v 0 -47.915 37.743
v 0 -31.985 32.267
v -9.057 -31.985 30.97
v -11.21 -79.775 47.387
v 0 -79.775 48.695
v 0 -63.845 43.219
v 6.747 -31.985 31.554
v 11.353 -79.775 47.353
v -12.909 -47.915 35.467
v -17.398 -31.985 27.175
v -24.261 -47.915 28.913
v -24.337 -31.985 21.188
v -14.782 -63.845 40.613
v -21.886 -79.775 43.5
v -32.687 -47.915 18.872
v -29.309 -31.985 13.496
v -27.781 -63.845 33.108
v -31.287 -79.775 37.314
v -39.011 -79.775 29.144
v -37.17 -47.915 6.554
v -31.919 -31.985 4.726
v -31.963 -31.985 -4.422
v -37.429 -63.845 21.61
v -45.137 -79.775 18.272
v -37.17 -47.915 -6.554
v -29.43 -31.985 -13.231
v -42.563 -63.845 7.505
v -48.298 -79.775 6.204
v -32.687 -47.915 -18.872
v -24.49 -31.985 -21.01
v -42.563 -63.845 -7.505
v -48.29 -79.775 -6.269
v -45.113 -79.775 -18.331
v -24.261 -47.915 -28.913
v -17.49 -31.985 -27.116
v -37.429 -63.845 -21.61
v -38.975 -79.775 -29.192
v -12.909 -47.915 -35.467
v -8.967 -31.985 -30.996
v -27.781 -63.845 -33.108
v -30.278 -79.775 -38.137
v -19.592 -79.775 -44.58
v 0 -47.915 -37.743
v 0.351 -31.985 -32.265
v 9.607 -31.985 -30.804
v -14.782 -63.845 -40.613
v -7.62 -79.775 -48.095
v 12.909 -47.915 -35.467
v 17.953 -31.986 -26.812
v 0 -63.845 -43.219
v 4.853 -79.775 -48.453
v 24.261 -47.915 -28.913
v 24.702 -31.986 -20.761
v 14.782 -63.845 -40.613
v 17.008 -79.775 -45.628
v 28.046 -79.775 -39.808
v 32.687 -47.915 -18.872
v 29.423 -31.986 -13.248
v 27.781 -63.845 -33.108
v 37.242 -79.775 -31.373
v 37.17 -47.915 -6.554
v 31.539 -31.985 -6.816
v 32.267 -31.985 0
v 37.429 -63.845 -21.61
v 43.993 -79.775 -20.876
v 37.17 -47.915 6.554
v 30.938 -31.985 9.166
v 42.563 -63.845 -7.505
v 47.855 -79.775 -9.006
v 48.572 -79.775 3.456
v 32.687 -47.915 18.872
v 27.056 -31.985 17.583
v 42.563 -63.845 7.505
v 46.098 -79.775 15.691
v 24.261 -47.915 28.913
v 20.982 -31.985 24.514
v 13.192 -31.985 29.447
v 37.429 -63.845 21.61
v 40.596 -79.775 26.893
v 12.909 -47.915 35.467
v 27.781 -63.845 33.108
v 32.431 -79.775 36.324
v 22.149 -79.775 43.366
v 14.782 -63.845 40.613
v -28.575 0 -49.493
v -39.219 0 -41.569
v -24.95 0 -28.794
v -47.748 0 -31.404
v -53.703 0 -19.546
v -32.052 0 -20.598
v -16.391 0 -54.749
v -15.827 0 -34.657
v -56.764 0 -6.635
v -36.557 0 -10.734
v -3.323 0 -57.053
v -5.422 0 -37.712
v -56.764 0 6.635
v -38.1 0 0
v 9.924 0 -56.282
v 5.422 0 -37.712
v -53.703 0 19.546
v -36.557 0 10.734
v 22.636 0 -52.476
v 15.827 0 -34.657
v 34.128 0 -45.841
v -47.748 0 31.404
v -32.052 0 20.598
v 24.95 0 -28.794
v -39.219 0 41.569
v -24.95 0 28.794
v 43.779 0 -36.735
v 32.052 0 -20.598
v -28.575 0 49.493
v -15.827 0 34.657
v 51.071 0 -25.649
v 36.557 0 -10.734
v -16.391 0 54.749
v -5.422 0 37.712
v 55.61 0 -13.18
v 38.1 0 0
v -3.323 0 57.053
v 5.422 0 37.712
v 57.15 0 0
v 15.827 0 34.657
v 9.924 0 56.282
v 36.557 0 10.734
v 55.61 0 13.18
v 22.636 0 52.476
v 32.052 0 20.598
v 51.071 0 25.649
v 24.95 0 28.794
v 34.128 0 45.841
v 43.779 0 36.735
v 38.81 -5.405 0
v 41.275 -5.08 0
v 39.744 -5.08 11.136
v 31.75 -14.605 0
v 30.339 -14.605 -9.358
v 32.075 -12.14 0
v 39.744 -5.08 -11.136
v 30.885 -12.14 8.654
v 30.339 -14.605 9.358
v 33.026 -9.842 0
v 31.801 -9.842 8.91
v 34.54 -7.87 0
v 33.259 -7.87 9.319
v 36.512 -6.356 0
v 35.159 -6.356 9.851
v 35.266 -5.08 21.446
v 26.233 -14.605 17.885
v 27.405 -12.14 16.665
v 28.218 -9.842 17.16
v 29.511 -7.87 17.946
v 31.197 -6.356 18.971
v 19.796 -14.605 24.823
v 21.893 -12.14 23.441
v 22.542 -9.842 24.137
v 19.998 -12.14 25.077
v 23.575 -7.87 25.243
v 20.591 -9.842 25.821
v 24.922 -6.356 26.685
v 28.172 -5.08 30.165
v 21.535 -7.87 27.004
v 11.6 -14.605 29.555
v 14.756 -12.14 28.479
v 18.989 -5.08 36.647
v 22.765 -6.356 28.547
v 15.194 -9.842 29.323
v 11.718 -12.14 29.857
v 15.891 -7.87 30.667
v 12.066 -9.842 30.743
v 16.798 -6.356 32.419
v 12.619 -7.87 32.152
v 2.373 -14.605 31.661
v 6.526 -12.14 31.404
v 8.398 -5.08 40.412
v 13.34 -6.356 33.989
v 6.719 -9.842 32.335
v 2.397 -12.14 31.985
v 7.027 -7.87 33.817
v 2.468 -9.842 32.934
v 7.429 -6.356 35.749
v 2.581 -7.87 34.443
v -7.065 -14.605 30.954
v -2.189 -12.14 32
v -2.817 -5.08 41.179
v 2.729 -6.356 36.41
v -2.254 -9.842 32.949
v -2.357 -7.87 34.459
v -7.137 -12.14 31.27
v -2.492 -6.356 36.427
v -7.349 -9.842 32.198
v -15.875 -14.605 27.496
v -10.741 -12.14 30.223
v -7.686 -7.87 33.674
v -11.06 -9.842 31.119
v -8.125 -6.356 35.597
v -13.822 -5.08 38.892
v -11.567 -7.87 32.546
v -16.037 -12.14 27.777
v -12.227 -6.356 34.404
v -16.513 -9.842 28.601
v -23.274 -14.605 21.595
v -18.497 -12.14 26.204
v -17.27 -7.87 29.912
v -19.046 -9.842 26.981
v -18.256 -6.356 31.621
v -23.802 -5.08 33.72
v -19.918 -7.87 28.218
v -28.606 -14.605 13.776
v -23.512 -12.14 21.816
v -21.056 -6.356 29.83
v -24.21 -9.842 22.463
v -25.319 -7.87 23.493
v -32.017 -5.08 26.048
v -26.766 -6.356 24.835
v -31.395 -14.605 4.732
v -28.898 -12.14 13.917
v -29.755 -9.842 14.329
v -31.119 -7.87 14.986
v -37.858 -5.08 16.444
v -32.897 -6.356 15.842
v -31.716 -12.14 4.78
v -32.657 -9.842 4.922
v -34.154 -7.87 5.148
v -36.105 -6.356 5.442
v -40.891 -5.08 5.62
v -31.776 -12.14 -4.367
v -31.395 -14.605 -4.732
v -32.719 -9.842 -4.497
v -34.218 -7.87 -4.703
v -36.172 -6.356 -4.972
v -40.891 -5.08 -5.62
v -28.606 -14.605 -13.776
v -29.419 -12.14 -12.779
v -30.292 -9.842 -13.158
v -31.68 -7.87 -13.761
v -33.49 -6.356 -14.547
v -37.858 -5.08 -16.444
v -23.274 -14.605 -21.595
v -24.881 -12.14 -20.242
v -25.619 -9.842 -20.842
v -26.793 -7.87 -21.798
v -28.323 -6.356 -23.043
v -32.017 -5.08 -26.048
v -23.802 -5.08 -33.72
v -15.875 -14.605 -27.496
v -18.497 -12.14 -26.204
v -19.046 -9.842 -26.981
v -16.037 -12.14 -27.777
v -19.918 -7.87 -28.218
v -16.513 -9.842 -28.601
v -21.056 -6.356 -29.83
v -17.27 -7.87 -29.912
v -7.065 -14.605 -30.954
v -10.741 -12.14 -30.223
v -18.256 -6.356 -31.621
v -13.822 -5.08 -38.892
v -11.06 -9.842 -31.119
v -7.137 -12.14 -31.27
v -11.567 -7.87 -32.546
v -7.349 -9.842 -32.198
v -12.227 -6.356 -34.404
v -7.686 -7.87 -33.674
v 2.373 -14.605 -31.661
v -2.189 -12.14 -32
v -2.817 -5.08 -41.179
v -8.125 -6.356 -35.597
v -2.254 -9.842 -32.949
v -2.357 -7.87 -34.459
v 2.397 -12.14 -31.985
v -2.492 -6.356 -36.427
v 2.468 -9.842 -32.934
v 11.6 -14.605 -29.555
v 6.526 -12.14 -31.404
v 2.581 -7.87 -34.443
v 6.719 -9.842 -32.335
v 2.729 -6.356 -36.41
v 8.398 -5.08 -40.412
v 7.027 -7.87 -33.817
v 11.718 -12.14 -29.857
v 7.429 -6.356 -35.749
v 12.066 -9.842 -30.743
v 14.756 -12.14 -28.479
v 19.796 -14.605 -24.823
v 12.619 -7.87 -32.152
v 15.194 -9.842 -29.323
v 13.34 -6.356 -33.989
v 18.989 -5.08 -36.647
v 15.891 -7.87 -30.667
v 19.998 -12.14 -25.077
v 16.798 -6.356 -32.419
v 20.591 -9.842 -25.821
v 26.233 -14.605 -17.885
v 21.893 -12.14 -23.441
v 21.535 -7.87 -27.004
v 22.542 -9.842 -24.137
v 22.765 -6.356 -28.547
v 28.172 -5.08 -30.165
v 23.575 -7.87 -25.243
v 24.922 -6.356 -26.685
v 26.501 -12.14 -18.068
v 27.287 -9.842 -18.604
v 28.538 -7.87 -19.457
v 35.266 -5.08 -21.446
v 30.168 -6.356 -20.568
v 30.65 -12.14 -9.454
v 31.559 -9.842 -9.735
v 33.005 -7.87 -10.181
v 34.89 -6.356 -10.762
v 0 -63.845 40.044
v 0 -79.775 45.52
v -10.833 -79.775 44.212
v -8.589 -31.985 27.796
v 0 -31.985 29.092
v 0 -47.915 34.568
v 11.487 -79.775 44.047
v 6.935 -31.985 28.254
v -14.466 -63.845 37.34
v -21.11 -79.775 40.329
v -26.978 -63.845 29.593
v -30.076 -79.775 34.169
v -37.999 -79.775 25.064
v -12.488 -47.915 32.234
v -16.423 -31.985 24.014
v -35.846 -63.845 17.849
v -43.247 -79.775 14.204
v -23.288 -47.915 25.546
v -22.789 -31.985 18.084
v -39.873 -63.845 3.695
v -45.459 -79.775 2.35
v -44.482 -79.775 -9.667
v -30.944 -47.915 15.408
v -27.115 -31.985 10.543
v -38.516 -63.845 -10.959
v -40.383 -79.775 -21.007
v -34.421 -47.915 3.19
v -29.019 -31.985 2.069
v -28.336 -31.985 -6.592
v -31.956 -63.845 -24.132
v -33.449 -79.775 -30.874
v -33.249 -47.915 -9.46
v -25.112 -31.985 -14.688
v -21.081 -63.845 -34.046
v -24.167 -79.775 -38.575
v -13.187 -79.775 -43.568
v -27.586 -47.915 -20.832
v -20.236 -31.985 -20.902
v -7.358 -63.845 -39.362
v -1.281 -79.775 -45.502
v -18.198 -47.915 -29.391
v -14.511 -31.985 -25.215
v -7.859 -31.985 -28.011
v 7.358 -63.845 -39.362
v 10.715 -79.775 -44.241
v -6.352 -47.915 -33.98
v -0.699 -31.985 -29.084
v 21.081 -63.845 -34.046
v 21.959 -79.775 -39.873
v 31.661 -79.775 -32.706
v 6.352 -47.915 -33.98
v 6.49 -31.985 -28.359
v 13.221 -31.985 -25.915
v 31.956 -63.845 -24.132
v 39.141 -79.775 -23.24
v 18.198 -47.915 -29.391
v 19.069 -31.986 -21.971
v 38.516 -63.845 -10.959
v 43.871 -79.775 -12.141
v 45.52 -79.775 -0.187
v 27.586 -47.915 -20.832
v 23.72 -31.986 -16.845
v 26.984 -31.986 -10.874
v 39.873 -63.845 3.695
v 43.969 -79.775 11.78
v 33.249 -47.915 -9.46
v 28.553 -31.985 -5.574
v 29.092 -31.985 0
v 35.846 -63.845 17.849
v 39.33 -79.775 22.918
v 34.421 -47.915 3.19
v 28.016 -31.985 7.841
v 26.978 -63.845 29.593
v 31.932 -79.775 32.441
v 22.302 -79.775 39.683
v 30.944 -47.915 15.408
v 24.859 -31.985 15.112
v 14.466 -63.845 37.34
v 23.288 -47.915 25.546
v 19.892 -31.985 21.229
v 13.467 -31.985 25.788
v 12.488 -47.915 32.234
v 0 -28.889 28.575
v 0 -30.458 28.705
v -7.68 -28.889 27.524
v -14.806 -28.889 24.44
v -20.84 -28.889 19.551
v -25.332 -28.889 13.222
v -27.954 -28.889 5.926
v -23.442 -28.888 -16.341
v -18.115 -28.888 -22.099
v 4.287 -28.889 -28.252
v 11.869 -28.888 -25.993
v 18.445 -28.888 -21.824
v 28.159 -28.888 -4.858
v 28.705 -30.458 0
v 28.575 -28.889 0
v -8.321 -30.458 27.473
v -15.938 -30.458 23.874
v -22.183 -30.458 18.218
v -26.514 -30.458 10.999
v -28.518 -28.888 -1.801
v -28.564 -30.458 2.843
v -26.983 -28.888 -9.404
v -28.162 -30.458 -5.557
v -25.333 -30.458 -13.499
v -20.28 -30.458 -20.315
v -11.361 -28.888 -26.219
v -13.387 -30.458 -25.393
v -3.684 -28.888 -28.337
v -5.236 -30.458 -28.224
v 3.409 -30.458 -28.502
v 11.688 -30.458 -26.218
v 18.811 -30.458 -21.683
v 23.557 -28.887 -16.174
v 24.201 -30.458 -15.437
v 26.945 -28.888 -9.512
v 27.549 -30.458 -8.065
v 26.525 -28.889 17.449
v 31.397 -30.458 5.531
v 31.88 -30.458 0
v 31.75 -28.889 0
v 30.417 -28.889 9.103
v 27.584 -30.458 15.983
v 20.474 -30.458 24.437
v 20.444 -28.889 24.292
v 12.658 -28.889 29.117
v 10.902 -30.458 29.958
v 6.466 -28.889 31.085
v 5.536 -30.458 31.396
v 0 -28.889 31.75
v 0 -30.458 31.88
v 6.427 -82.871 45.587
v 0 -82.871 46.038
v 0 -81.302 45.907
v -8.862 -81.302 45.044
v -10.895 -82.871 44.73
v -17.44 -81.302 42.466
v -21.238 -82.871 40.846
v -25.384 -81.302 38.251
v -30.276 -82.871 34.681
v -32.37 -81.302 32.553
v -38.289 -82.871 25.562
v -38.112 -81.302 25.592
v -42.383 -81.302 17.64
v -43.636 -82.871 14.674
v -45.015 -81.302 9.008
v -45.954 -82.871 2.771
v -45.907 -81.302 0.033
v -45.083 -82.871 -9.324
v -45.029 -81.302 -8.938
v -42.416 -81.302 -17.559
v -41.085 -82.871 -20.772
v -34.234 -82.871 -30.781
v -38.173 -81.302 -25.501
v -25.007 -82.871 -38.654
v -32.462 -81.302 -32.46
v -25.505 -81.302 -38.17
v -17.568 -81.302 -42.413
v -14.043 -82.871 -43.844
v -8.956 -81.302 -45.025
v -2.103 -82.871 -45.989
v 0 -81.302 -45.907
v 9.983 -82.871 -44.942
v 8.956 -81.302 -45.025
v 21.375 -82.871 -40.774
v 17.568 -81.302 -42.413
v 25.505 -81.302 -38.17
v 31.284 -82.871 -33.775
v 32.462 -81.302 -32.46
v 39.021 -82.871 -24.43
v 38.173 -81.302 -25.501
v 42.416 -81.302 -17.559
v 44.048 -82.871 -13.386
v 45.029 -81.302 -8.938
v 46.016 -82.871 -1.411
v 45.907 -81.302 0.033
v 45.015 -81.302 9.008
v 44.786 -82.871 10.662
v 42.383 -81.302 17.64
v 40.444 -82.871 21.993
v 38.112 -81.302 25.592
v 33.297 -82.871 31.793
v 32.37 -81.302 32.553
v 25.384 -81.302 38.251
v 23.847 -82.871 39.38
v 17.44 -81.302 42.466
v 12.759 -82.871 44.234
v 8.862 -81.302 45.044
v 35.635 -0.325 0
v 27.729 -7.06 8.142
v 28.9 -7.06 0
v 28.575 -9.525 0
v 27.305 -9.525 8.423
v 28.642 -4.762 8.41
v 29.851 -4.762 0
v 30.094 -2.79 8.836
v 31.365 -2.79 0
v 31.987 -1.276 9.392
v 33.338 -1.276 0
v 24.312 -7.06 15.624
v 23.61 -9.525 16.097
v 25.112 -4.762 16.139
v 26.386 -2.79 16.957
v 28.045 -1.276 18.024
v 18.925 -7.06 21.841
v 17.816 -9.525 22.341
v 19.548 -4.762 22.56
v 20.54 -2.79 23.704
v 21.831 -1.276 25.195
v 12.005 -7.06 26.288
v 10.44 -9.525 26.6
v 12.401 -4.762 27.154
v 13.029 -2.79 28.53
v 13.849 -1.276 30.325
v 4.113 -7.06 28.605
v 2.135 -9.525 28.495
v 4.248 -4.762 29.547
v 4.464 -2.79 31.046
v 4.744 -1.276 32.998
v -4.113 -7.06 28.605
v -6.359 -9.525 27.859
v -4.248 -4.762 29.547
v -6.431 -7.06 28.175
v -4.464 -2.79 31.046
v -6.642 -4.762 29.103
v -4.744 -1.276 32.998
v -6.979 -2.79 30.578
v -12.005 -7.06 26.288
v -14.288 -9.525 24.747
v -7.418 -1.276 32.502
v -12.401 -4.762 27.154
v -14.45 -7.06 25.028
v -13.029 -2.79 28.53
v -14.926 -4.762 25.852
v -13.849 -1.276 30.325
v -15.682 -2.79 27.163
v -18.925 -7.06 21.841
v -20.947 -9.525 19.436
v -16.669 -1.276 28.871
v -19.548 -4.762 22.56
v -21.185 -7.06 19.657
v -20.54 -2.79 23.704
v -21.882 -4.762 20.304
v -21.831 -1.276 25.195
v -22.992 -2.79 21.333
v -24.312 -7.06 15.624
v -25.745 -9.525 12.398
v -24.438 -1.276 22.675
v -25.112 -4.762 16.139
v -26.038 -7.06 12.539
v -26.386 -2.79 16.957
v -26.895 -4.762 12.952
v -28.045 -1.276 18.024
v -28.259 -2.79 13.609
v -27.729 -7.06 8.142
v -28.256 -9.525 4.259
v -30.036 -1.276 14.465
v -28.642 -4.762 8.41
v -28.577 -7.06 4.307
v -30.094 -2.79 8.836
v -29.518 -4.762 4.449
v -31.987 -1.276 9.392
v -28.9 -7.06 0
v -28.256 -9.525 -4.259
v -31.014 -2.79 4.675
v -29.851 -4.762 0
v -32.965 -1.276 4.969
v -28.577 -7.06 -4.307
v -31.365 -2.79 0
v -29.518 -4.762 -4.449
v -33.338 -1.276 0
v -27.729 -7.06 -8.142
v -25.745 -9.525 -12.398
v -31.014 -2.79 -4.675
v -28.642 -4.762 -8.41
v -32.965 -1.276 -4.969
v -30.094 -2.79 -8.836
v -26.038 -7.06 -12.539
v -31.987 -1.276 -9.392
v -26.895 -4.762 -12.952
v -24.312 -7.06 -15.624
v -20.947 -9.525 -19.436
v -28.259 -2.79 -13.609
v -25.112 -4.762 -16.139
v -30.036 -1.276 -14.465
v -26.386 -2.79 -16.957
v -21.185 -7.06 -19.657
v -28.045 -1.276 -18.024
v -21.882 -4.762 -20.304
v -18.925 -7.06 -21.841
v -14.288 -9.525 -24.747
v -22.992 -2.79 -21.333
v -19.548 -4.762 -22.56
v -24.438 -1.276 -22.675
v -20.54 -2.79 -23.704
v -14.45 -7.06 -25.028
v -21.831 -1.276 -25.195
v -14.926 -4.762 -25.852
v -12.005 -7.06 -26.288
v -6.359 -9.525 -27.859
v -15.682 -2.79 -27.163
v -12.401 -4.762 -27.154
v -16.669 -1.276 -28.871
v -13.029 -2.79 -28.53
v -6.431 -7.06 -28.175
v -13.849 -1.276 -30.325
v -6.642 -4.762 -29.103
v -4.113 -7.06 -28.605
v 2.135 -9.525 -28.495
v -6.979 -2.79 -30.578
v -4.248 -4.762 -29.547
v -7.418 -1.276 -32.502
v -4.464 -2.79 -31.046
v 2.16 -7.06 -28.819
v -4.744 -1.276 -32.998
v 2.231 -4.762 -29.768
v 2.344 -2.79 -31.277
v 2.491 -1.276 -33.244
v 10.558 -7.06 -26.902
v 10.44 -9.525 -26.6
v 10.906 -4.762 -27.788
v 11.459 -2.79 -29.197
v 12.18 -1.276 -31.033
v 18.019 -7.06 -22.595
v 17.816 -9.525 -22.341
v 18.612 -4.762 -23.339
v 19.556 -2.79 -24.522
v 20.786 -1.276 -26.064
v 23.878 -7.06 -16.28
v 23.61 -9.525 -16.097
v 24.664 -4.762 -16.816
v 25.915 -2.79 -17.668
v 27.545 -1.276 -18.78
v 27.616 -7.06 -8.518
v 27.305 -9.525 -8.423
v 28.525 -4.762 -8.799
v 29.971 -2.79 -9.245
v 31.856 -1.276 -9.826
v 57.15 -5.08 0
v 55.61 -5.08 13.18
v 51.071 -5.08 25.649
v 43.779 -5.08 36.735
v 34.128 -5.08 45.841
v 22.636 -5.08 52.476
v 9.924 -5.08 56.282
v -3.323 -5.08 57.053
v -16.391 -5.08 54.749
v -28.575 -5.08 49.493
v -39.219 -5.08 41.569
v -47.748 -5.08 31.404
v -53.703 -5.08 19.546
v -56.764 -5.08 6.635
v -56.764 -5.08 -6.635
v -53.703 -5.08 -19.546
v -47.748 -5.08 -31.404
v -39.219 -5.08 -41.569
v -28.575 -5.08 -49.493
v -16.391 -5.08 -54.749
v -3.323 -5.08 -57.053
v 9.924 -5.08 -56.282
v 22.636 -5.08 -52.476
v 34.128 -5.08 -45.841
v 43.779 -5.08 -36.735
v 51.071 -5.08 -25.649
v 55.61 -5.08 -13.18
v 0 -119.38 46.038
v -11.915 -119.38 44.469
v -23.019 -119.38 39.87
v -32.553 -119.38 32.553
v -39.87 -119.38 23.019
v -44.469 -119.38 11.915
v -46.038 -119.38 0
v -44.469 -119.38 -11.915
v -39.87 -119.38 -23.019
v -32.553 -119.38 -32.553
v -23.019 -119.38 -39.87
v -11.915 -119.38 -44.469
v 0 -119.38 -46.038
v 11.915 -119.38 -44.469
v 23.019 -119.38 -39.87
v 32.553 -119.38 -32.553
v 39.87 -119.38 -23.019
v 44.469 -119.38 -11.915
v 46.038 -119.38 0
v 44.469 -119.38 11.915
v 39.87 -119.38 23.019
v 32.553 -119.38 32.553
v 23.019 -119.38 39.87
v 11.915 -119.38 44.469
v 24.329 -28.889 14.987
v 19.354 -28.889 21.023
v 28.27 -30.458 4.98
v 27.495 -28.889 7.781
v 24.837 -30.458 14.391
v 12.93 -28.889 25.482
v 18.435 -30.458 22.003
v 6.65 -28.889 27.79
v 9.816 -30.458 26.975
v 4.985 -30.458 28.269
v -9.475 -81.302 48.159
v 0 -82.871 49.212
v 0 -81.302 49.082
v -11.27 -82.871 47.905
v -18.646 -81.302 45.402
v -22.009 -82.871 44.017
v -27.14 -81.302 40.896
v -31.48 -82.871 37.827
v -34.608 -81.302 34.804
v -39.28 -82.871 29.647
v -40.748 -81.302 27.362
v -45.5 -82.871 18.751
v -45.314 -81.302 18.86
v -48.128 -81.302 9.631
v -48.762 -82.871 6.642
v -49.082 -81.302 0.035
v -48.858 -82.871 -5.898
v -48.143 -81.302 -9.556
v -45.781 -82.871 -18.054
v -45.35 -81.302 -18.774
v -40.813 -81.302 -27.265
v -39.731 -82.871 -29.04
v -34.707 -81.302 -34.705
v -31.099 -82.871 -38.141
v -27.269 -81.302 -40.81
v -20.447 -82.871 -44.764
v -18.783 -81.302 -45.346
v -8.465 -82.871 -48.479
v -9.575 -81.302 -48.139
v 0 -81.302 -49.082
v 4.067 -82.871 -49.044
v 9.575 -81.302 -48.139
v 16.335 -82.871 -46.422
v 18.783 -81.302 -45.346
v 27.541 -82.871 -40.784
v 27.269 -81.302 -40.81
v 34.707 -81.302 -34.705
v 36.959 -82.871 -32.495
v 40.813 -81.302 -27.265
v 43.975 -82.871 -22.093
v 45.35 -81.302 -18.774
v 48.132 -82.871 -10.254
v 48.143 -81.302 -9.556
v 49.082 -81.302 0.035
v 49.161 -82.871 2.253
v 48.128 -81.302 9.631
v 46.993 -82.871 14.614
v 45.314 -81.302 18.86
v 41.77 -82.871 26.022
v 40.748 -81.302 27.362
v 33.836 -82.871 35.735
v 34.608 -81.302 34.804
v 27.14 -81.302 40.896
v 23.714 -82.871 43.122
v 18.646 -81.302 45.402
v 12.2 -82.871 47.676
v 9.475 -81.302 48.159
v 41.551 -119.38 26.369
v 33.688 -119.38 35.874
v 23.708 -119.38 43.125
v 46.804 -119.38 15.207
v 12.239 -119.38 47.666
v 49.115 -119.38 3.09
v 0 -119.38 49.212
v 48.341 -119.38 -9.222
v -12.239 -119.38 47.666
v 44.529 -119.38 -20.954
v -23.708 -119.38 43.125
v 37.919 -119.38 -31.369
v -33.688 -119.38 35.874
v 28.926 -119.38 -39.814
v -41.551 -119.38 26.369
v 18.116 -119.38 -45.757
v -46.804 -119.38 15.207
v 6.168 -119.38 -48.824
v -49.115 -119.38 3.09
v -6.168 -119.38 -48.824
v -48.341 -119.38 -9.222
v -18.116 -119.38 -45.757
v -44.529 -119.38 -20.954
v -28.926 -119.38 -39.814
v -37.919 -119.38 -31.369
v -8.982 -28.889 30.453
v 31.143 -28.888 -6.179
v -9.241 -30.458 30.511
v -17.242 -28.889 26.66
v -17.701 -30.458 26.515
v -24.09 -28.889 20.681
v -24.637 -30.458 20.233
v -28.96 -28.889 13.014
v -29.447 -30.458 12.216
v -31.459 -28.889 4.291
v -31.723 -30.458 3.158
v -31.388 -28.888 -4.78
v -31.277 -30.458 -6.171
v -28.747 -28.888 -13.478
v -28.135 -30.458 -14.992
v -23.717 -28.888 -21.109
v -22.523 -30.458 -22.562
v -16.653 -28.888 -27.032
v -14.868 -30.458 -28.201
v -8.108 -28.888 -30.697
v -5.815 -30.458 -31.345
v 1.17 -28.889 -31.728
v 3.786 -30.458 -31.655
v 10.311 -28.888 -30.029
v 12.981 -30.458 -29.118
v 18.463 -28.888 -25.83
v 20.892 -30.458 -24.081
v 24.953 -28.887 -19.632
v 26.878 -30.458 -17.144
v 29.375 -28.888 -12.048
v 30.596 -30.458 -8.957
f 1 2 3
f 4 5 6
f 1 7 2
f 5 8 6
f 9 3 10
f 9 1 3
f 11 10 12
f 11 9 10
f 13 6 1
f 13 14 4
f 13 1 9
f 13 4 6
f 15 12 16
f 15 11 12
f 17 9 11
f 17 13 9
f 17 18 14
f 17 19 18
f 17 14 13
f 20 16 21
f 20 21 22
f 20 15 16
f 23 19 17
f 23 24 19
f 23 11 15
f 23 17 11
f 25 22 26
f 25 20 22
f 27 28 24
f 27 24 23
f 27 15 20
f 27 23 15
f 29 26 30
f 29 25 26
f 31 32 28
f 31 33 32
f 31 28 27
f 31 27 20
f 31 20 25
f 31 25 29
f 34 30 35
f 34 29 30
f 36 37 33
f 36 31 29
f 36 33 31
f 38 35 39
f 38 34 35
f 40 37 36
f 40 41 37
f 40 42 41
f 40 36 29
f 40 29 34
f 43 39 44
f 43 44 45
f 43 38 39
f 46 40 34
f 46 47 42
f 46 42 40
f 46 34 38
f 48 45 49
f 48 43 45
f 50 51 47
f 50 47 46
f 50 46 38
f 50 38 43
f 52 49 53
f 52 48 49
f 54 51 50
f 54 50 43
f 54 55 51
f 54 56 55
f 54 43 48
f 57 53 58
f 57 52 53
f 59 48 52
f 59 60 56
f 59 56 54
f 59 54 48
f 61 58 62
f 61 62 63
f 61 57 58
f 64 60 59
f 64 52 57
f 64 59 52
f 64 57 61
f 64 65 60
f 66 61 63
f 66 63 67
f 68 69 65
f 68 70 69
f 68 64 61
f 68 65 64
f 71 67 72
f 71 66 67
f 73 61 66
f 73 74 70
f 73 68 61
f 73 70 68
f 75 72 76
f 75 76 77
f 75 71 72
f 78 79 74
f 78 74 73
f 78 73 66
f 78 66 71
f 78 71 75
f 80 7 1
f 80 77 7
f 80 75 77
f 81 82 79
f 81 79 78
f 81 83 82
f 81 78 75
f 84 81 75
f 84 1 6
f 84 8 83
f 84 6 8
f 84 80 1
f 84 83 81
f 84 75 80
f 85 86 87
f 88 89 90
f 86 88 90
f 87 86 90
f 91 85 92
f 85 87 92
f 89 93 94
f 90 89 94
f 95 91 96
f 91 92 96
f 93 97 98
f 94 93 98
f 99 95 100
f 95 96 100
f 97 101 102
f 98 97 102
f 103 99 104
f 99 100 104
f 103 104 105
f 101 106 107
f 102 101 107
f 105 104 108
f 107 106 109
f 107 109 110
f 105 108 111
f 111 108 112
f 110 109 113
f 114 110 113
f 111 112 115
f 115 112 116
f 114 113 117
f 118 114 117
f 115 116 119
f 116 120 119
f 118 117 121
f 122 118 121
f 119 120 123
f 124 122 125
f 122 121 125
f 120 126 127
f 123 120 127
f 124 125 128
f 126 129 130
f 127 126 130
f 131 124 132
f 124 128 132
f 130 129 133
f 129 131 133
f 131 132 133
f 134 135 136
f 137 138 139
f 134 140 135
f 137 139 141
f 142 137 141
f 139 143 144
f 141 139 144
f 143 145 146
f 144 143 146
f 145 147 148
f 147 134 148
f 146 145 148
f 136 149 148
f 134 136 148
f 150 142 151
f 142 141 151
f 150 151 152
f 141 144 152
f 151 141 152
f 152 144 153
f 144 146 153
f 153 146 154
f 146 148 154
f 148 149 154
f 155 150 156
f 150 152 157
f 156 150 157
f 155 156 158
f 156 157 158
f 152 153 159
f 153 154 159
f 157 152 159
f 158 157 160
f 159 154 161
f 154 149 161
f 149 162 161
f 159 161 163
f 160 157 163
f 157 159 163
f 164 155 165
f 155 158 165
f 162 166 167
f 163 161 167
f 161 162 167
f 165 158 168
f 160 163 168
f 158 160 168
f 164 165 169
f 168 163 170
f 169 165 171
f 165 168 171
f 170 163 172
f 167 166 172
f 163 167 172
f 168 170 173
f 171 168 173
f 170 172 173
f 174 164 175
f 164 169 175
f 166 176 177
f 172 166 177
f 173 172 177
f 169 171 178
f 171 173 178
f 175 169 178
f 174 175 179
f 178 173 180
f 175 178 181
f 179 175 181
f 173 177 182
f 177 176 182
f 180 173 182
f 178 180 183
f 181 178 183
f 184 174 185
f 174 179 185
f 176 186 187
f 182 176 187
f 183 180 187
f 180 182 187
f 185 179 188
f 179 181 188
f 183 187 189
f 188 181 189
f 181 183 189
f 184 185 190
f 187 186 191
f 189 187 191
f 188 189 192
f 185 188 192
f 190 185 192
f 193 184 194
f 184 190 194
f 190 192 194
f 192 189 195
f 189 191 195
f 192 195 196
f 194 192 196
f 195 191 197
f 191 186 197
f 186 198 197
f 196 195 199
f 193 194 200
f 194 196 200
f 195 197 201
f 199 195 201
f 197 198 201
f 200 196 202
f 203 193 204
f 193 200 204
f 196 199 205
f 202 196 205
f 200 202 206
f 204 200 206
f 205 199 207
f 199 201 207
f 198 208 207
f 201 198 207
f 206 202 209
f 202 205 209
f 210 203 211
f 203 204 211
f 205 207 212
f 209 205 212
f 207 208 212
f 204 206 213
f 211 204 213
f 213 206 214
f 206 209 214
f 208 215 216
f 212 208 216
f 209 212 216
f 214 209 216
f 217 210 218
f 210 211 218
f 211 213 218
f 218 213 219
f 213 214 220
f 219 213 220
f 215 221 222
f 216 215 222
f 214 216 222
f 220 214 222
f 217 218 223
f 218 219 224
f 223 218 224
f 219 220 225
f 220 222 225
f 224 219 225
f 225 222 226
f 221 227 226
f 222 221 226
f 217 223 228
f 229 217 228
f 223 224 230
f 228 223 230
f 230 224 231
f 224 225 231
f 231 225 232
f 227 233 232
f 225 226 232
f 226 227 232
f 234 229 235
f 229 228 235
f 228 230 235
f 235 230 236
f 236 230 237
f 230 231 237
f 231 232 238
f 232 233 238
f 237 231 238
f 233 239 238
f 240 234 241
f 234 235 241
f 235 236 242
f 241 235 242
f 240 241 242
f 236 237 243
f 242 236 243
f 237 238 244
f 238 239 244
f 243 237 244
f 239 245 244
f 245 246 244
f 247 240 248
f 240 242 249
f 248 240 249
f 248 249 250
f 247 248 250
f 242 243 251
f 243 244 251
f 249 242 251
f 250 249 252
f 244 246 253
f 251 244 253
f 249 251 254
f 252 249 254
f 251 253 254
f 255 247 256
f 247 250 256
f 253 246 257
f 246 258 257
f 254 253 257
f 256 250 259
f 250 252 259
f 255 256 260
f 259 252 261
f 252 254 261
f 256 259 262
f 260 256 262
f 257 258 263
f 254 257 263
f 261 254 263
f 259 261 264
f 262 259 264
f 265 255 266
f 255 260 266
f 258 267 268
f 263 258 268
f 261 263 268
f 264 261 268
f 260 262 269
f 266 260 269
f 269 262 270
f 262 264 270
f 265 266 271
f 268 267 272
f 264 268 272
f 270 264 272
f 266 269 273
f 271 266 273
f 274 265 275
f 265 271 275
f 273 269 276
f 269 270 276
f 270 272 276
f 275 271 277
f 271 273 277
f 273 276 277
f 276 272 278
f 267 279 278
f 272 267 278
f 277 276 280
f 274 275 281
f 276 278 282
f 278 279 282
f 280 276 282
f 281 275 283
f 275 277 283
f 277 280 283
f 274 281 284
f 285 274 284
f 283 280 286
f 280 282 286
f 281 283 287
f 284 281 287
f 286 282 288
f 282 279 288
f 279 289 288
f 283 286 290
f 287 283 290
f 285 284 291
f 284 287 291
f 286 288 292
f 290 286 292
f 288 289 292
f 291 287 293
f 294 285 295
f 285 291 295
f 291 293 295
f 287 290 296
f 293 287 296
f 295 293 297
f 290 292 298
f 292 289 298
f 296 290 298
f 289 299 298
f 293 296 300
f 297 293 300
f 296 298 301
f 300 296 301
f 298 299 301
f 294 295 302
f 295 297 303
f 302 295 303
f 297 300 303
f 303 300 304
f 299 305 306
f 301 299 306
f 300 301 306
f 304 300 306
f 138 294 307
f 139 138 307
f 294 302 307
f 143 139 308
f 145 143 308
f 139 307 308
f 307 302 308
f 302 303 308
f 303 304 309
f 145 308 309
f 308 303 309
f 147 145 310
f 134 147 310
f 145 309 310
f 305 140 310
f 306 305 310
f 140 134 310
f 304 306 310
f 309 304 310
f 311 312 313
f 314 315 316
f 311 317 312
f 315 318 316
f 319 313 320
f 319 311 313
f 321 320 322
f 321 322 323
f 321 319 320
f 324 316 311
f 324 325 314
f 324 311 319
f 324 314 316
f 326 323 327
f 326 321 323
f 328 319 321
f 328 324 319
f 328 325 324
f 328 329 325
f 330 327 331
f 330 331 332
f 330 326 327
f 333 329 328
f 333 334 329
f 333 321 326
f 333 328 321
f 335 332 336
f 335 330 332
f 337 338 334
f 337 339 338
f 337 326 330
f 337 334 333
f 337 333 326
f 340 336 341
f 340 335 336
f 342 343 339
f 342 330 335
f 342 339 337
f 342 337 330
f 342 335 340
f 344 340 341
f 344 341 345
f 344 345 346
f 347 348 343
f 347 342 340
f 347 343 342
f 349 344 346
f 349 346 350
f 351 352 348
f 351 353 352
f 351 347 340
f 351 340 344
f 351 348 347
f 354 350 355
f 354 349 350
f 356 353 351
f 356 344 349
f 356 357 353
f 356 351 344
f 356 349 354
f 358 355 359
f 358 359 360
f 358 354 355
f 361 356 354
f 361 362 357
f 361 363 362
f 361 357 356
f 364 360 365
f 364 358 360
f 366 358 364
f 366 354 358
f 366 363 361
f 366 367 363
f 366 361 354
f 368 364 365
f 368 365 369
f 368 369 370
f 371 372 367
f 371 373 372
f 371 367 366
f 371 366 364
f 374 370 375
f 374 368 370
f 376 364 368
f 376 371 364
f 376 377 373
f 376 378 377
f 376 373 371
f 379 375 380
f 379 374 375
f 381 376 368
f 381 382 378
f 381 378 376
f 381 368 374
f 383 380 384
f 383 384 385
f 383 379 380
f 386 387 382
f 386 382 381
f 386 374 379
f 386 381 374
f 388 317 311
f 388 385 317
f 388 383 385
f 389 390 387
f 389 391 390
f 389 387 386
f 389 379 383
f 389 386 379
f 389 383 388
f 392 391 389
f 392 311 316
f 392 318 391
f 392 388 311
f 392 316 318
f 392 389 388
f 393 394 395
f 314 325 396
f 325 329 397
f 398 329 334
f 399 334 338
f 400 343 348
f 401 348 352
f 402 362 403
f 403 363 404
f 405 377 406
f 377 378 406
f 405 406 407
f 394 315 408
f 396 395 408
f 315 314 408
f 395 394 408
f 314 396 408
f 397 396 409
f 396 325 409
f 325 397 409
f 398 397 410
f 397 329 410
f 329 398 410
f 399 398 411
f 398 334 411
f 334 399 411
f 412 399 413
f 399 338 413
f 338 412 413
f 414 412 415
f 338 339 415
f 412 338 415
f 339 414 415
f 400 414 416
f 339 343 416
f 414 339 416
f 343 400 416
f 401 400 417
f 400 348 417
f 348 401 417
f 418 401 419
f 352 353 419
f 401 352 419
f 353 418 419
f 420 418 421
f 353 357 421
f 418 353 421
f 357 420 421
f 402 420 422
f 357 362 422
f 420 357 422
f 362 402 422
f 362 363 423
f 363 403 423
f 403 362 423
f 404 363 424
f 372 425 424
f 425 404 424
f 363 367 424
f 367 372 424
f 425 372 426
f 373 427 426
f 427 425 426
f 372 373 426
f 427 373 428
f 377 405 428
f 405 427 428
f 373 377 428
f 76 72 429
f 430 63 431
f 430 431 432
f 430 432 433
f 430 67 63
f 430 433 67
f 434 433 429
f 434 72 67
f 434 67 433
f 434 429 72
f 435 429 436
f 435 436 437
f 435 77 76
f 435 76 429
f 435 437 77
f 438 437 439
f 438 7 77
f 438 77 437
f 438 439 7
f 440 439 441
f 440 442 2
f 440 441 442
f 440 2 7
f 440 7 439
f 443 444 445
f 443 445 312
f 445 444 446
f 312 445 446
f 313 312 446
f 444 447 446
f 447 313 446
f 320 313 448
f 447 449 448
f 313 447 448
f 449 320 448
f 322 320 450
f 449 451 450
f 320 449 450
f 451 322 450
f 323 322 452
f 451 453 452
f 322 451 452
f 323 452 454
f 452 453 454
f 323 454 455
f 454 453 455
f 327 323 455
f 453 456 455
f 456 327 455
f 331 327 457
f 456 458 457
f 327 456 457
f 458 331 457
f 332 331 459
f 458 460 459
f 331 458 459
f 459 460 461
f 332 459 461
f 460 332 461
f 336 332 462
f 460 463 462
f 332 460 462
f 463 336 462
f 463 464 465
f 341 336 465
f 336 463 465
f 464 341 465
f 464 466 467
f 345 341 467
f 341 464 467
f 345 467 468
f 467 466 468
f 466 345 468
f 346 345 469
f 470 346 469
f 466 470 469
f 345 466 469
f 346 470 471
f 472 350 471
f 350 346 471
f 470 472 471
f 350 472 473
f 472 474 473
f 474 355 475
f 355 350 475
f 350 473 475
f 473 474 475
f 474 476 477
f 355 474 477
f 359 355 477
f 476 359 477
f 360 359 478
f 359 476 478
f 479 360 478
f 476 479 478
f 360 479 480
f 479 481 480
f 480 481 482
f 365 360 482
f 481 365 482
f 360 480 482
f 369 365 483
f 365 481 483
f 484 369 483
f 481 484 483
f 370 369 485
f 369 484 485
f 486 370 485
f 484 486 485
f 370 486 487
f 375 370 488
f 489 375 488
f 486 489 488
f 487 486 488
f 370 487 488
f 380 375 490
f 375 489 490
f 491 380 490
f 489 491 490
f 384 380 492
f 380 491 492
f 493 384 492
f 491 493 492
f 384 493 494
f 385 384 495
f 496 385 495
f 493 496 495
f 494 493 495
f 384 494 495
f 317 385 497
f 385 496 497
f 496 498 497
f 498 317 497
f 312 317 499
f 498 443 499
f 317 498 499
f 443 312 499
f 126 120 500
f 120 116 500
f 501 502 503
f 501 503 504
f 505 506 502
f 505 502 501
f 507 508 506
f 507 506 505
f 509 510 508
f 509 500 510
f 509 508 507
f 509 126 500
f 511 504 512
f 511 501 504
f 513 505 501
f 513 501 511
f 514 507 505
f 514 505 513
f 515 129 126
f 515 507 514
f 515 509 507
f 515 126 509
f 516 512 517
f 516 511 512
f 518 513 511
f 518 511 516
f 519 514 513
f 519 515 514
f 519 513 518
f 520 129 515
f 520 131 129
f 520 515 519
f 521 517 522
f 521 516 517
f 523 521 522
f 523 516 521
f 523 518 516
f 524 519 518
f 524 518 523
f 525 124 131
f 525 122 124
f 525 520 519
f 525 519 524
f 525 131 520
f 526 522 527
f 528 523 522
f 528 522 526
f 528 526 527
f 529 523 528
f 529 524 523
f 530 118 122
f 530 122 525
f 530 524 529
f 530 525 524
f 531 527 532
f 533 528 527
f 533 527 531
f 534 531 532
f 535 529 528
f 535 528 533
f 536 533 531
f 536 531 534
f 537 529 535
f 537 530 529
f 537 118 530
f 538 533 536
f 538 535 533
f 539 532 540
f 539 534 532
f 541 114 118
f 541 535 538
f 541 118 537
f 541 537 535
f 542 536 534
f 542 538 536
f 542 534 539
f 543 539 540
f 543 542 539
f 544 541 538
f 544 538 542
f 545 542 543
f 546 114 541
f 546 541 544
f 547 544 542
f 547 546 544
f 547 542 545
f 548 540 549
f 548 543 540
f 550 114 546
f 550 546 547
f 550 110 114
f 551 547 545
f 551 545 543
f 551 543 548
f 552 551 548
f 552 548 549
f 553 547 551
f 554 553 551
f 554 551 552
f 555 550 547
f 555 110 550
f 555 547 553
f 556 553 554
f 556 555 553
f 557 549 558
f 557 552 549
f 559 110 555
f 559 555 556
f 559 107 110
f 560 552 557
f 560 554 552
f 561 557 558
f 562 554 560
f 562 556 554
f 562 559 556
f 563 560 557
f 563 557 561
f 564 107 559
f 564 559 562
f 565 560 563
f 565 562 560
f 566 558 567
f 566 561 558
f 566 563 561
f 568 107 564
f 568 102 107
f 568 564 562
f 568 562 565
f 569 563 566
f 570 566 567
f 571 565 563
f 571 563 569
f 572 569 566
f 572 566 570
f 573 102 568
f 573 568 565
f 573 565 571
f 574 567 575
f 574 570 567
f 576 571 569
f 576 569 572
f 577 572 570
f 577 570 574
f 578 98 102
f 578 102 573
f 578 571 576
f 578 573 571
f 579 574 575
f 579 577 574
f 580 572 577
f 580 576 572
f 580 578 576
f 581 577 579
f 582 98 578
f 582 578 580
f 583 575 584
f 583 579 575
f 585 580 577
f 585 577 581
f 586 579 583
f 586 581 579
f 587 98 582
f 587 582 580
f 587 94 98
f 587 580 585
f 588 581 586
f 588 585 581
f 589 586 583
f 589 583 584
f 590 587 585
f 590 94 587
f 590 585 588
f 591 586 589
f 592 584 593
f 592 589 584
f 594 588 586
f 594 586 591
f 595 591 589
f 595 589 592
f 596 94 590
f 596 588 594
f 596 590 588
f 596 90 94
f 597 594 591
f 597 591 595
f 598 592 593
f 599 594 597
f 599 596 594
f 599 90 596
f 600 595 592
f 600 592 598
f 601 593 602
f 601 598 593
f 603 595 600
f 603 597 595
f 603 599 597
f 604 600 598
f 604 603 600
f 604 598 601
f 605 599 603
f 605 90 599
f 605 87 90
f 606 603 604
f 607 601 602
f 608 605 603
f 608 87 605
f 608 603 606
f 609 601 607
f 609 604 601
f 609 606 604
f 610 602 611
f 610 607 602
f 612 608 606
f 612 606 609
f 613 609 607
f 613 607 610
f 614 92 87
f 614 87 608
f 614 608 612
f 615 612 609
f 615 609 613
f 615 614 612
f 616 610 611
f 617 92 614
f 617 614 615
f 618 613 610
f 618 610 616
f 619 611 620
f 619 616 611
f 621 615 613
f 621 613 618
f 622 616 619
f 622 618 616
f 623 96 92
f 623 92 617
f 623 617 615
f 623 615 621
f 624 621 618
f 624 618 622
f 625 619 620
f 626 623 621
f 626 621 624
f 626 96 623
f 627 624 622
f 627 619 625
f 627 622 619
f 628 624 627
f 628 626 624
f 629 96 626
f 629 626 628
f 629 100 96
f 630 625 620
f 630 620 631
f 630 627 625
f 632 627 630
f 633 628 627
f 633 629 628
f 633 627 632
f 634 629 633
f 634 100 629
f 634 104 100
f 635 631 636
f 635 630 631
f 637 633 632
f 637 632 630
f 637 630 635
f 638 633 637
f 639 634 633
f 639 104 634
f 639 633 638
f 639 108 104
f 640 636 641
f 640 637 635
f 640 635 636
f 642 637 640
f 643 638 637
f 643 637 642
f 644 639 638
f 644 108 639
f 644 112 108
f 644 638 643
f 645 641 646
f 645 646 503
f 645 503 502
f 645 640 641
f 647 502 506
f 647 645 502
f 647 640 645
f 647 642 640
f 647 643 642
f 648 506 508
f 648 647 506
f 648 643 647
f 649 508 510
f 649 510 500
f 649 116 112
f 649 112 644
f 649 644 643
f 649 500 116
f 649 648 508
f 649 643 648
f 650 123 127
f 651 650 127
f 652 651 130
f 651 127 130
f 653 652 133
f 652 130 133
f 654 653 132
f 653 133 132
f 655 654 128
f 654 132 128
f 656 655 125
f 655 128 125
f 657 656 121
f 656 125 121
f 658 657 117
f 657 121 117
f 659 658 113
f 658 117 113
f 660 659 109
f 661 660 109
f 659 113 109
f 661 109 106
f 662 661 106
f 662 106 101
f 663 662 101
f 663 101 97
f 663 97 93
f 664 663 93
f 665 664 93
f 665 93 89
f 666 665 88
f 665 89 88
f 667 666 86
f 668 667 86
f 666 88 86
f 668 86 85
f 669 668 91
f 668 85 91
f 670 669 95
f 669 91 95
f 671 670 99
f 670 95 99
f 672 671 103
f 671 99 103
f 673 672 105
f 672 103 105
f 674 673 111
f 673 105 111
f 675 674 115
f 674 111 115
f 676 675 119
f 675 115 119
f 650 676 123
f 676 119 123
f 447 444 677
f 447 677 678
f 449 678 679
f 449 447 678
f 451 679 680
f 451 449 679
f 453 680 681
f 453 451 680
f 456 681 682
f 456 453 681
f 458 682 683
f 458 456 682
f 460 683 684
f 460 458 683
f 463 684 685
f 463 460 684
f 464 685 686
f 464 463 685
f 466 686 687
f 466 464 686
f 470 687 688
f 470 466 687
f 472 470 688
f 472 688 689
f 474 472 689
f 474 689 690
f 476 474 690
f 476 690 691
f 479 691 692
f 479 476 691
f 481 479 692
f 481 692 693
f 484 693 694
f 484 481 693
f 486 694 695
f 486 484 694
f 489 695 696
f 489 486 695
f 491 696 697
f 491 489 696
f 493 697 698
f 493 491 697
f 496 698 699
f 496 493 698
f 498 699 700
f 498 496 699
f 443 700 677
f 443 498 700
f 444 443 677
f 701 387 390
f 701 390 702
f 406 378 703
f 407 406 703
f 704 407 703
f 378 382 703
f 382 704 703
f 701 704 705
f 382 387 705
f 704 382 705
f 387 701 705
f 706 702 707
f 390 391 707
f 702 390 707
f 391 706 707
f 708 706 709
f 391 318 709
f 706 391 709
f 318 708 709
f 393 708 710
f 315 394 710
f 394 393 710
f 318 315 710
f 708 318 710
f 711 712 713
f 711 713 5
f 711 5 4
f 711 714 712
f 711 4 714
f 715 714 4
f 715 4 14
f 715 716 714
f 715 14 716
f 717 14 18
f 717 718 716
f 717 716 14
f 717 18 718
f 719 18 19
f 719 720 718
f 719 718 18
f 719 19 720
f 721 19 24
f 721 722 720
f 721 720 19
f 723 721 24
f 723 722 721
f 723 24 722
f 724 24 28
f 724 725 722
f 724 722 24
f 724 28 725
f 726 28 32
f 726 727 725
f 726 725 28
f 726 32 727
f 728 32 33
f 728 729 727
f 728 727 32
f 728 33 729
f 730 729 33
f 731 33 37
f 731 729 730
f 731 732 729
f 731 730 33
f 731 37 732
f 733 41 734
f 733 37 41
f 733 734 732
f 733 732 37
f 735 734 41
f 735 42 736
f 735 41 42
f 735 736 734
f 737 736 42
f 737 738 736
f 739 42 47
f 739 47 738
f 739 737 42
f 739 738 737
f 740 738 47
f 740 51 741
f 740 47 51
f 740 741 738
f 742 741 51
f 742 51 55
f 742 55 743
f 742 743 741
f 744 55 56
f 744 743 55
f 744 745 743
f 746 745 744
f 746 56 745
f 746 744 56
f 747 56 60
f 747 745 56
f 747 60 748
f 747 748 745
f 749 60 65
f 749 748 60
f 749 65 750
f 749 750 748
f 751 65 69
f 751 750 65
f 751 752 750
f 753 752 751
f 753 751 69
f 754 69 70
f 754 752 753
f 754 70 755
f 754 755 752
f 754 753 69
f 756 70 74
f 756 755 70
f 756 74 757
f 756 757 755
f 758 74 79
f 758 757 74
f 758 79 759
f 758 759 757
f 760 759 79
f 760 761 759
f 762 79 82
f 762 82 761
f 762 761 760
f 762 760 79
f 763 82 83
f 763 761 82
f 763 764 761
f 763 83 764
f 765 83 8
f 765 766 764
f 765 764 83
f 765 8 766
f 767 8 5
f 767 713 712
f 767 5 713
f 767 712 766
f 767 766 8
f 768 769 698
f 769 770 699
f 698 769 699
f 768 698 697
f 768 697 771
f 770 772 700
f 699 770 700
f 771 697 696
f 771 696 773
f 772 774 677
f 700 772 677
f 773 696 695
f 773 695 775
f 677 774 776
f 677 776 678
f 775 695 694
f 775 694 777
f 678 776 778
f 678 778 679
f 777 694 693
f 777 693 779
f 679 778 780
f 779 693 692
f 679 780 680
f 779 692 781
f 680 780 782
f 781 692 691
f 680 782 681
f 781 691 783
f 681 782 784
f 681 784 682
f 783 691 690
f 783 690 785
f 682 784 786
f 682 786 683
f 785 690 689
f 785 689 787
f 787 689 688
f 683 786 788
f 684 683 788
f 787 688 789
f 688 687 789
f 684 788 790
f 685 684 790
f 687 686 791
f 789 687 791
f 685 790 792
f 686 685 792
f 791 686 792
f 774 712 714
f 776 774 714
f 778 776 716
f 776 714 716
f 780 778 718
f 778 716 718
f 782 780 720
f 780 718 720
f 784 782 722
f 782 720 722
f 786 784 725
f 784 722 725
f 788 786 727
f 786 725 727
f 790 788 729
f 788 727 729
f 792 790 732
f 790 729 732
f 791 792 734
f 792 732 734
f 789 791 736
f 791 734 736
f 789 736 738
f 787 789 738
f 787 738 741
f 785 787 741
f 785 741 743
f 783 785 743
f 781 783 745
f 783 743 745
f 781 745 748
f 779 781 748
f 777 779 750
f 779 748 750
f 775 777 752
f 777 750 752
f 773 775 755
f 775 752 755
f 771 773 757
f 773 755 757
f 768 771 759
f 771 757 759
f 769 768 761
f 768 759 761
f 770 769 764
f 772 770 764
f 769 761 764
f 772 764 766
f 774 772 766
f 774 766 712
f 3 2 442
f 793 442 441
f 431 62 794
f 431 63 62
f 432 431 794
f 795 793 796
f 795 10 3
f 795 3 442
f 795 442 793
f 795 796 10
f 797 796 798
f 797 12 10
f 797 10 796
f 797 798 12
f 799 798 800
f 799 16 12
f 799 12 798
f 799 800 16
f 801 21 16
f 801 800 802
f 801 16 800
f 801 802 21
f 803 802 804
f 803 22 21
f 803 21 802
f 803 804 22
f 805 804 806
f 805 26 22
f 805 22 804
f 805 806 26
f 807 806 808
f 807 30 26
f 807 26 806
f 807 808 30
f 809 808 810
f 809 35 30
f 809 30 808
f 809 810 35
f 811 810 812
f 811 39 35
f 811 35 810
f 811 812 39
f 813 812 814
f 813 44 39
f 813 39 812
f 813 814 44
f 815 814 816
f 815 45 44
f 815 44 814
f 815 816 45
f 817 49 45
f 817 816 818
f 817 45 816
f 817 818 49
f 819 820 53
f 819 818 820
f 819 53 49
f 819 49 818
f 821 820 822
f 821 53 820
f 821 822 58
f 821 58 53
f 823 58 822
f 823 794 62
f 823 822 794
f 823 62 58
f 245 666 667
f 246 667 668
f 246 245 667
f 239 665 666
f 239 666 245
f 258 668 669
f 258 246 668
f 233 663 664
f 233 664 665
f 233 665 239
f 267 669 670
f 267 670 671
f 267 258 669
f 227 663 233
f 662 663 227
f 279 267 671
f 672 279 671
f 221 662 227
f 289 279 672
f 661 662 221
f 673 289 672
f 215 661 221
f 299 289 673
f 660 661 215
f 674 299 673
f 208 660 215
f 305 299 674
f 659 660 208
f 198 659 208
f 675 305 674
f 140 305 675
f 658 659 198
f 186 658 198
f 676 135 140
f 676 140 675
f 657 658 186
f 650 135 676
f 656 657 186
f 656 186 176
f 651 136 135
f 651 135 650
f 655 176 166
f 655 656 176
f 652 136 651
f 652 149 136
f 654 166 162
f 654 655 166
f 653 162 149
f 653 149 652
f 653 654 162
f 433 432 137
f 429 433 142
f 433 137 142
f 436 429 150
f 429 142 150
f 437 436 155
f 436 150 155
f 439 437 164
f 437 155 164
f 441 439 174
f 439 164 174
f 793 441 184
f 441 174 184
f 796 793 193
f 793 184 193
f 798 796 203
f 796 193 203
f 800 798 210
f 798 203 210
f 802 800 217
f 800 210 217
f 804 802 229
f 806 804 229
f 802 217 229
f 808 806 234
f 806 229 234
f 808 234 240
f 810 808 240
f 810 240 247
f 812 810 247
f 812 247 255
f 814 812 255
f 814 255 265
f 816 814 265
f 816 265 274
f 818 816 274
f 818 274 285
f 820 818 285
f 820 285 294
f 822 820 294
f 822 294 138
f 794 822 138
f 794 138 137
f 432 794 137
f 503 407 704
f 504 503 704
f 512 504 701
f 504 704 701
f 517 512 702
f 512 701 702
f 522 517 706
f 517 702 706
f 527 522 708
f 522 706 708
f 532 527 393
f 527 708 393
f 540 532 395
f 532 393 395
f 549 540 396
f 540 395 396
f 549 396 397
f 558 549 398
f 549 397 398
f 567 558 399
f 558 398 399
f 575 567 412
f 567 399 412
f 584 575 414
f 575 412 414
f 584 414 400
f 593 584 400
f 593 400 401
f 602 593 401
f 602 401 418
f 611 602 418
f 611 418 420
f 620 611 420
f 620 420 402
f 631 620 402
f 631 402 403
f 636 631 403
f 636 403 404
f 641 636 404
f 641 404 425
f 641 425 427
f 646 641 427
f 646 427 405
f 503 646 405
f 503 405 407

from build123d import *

# Parameters (mm, degrees)
F0_R     = 57.15
F1_DEPTH = 5.08
F2_R     = 31.75
F3_DEPTH = 25.4
F4_R     = 28.575
F5_DEPTH = 30.481
F8_W     = 38.1
F8_H     = 3.175
F10_R    = 9.525
F11_R    = 9.525


with BuildPart() as f1:
    # F0 (on Front) → F1 (new body)
    with BuildSketch(Plane.XZ):
        Circle(F0_R)
    extrude(amount=F1_DEPTH)

    # F2 (on face) → F3 (join)
    with BuildSketch(Plane.XZ.offset(5.08)):
        Circle(F2_R)
    extrude(amount=F3_DEPTH)

    # F4 (on face) → F5 (cut, through all)
    with BuildSketch(Plane.XZ.offset(30.48)):
        Circle(F4_R)
    extrude(amount=-F5_DEPTH, mode=Mode.SUBTRACT)

    # F6 (on Right) → F7 (revolve)
    with BuildSketch(Plane.YZ):
        Polygon((-81.28, 46.0375), (-30.48, 28.575), (-30.48, 31.75), (-81.28, 49.2125), align=None)
    revolve(axis=Axis((0, -18.848058, 0), (0, -1, 0)))

    # F8 (on Right) → F9 (revolve)
    with BuildSketch(Plane.YZ):
        with Locations((-100.33, 47.625)):
            Rectangle(F8_W, F8_H)
    revolve(axis=Axis((0, -63.416593, 0), (0, -1, 0)))

    # F10
    f10_edges = [f1.edges().sort_by_distance(p)[0] for p in [
        (-31.75, -5.08, 0),
        (-22.45064, -30.48, -22.45064),
        (0, -81.28, -49.2125),
    ]]
    fillet(f10_edges, radius=F10_R)

    # F11
    f11_edges = [f1.edges().sort_by_distance(p)[0] for p in [
        (-28.575, 0, 0),
        (-20.205576, -30.48, -20.205576),
        (0, -81.28, -46.0375),
    ]]
    fillet(f11_edges, radius=F11_R)


solid = f1.part
